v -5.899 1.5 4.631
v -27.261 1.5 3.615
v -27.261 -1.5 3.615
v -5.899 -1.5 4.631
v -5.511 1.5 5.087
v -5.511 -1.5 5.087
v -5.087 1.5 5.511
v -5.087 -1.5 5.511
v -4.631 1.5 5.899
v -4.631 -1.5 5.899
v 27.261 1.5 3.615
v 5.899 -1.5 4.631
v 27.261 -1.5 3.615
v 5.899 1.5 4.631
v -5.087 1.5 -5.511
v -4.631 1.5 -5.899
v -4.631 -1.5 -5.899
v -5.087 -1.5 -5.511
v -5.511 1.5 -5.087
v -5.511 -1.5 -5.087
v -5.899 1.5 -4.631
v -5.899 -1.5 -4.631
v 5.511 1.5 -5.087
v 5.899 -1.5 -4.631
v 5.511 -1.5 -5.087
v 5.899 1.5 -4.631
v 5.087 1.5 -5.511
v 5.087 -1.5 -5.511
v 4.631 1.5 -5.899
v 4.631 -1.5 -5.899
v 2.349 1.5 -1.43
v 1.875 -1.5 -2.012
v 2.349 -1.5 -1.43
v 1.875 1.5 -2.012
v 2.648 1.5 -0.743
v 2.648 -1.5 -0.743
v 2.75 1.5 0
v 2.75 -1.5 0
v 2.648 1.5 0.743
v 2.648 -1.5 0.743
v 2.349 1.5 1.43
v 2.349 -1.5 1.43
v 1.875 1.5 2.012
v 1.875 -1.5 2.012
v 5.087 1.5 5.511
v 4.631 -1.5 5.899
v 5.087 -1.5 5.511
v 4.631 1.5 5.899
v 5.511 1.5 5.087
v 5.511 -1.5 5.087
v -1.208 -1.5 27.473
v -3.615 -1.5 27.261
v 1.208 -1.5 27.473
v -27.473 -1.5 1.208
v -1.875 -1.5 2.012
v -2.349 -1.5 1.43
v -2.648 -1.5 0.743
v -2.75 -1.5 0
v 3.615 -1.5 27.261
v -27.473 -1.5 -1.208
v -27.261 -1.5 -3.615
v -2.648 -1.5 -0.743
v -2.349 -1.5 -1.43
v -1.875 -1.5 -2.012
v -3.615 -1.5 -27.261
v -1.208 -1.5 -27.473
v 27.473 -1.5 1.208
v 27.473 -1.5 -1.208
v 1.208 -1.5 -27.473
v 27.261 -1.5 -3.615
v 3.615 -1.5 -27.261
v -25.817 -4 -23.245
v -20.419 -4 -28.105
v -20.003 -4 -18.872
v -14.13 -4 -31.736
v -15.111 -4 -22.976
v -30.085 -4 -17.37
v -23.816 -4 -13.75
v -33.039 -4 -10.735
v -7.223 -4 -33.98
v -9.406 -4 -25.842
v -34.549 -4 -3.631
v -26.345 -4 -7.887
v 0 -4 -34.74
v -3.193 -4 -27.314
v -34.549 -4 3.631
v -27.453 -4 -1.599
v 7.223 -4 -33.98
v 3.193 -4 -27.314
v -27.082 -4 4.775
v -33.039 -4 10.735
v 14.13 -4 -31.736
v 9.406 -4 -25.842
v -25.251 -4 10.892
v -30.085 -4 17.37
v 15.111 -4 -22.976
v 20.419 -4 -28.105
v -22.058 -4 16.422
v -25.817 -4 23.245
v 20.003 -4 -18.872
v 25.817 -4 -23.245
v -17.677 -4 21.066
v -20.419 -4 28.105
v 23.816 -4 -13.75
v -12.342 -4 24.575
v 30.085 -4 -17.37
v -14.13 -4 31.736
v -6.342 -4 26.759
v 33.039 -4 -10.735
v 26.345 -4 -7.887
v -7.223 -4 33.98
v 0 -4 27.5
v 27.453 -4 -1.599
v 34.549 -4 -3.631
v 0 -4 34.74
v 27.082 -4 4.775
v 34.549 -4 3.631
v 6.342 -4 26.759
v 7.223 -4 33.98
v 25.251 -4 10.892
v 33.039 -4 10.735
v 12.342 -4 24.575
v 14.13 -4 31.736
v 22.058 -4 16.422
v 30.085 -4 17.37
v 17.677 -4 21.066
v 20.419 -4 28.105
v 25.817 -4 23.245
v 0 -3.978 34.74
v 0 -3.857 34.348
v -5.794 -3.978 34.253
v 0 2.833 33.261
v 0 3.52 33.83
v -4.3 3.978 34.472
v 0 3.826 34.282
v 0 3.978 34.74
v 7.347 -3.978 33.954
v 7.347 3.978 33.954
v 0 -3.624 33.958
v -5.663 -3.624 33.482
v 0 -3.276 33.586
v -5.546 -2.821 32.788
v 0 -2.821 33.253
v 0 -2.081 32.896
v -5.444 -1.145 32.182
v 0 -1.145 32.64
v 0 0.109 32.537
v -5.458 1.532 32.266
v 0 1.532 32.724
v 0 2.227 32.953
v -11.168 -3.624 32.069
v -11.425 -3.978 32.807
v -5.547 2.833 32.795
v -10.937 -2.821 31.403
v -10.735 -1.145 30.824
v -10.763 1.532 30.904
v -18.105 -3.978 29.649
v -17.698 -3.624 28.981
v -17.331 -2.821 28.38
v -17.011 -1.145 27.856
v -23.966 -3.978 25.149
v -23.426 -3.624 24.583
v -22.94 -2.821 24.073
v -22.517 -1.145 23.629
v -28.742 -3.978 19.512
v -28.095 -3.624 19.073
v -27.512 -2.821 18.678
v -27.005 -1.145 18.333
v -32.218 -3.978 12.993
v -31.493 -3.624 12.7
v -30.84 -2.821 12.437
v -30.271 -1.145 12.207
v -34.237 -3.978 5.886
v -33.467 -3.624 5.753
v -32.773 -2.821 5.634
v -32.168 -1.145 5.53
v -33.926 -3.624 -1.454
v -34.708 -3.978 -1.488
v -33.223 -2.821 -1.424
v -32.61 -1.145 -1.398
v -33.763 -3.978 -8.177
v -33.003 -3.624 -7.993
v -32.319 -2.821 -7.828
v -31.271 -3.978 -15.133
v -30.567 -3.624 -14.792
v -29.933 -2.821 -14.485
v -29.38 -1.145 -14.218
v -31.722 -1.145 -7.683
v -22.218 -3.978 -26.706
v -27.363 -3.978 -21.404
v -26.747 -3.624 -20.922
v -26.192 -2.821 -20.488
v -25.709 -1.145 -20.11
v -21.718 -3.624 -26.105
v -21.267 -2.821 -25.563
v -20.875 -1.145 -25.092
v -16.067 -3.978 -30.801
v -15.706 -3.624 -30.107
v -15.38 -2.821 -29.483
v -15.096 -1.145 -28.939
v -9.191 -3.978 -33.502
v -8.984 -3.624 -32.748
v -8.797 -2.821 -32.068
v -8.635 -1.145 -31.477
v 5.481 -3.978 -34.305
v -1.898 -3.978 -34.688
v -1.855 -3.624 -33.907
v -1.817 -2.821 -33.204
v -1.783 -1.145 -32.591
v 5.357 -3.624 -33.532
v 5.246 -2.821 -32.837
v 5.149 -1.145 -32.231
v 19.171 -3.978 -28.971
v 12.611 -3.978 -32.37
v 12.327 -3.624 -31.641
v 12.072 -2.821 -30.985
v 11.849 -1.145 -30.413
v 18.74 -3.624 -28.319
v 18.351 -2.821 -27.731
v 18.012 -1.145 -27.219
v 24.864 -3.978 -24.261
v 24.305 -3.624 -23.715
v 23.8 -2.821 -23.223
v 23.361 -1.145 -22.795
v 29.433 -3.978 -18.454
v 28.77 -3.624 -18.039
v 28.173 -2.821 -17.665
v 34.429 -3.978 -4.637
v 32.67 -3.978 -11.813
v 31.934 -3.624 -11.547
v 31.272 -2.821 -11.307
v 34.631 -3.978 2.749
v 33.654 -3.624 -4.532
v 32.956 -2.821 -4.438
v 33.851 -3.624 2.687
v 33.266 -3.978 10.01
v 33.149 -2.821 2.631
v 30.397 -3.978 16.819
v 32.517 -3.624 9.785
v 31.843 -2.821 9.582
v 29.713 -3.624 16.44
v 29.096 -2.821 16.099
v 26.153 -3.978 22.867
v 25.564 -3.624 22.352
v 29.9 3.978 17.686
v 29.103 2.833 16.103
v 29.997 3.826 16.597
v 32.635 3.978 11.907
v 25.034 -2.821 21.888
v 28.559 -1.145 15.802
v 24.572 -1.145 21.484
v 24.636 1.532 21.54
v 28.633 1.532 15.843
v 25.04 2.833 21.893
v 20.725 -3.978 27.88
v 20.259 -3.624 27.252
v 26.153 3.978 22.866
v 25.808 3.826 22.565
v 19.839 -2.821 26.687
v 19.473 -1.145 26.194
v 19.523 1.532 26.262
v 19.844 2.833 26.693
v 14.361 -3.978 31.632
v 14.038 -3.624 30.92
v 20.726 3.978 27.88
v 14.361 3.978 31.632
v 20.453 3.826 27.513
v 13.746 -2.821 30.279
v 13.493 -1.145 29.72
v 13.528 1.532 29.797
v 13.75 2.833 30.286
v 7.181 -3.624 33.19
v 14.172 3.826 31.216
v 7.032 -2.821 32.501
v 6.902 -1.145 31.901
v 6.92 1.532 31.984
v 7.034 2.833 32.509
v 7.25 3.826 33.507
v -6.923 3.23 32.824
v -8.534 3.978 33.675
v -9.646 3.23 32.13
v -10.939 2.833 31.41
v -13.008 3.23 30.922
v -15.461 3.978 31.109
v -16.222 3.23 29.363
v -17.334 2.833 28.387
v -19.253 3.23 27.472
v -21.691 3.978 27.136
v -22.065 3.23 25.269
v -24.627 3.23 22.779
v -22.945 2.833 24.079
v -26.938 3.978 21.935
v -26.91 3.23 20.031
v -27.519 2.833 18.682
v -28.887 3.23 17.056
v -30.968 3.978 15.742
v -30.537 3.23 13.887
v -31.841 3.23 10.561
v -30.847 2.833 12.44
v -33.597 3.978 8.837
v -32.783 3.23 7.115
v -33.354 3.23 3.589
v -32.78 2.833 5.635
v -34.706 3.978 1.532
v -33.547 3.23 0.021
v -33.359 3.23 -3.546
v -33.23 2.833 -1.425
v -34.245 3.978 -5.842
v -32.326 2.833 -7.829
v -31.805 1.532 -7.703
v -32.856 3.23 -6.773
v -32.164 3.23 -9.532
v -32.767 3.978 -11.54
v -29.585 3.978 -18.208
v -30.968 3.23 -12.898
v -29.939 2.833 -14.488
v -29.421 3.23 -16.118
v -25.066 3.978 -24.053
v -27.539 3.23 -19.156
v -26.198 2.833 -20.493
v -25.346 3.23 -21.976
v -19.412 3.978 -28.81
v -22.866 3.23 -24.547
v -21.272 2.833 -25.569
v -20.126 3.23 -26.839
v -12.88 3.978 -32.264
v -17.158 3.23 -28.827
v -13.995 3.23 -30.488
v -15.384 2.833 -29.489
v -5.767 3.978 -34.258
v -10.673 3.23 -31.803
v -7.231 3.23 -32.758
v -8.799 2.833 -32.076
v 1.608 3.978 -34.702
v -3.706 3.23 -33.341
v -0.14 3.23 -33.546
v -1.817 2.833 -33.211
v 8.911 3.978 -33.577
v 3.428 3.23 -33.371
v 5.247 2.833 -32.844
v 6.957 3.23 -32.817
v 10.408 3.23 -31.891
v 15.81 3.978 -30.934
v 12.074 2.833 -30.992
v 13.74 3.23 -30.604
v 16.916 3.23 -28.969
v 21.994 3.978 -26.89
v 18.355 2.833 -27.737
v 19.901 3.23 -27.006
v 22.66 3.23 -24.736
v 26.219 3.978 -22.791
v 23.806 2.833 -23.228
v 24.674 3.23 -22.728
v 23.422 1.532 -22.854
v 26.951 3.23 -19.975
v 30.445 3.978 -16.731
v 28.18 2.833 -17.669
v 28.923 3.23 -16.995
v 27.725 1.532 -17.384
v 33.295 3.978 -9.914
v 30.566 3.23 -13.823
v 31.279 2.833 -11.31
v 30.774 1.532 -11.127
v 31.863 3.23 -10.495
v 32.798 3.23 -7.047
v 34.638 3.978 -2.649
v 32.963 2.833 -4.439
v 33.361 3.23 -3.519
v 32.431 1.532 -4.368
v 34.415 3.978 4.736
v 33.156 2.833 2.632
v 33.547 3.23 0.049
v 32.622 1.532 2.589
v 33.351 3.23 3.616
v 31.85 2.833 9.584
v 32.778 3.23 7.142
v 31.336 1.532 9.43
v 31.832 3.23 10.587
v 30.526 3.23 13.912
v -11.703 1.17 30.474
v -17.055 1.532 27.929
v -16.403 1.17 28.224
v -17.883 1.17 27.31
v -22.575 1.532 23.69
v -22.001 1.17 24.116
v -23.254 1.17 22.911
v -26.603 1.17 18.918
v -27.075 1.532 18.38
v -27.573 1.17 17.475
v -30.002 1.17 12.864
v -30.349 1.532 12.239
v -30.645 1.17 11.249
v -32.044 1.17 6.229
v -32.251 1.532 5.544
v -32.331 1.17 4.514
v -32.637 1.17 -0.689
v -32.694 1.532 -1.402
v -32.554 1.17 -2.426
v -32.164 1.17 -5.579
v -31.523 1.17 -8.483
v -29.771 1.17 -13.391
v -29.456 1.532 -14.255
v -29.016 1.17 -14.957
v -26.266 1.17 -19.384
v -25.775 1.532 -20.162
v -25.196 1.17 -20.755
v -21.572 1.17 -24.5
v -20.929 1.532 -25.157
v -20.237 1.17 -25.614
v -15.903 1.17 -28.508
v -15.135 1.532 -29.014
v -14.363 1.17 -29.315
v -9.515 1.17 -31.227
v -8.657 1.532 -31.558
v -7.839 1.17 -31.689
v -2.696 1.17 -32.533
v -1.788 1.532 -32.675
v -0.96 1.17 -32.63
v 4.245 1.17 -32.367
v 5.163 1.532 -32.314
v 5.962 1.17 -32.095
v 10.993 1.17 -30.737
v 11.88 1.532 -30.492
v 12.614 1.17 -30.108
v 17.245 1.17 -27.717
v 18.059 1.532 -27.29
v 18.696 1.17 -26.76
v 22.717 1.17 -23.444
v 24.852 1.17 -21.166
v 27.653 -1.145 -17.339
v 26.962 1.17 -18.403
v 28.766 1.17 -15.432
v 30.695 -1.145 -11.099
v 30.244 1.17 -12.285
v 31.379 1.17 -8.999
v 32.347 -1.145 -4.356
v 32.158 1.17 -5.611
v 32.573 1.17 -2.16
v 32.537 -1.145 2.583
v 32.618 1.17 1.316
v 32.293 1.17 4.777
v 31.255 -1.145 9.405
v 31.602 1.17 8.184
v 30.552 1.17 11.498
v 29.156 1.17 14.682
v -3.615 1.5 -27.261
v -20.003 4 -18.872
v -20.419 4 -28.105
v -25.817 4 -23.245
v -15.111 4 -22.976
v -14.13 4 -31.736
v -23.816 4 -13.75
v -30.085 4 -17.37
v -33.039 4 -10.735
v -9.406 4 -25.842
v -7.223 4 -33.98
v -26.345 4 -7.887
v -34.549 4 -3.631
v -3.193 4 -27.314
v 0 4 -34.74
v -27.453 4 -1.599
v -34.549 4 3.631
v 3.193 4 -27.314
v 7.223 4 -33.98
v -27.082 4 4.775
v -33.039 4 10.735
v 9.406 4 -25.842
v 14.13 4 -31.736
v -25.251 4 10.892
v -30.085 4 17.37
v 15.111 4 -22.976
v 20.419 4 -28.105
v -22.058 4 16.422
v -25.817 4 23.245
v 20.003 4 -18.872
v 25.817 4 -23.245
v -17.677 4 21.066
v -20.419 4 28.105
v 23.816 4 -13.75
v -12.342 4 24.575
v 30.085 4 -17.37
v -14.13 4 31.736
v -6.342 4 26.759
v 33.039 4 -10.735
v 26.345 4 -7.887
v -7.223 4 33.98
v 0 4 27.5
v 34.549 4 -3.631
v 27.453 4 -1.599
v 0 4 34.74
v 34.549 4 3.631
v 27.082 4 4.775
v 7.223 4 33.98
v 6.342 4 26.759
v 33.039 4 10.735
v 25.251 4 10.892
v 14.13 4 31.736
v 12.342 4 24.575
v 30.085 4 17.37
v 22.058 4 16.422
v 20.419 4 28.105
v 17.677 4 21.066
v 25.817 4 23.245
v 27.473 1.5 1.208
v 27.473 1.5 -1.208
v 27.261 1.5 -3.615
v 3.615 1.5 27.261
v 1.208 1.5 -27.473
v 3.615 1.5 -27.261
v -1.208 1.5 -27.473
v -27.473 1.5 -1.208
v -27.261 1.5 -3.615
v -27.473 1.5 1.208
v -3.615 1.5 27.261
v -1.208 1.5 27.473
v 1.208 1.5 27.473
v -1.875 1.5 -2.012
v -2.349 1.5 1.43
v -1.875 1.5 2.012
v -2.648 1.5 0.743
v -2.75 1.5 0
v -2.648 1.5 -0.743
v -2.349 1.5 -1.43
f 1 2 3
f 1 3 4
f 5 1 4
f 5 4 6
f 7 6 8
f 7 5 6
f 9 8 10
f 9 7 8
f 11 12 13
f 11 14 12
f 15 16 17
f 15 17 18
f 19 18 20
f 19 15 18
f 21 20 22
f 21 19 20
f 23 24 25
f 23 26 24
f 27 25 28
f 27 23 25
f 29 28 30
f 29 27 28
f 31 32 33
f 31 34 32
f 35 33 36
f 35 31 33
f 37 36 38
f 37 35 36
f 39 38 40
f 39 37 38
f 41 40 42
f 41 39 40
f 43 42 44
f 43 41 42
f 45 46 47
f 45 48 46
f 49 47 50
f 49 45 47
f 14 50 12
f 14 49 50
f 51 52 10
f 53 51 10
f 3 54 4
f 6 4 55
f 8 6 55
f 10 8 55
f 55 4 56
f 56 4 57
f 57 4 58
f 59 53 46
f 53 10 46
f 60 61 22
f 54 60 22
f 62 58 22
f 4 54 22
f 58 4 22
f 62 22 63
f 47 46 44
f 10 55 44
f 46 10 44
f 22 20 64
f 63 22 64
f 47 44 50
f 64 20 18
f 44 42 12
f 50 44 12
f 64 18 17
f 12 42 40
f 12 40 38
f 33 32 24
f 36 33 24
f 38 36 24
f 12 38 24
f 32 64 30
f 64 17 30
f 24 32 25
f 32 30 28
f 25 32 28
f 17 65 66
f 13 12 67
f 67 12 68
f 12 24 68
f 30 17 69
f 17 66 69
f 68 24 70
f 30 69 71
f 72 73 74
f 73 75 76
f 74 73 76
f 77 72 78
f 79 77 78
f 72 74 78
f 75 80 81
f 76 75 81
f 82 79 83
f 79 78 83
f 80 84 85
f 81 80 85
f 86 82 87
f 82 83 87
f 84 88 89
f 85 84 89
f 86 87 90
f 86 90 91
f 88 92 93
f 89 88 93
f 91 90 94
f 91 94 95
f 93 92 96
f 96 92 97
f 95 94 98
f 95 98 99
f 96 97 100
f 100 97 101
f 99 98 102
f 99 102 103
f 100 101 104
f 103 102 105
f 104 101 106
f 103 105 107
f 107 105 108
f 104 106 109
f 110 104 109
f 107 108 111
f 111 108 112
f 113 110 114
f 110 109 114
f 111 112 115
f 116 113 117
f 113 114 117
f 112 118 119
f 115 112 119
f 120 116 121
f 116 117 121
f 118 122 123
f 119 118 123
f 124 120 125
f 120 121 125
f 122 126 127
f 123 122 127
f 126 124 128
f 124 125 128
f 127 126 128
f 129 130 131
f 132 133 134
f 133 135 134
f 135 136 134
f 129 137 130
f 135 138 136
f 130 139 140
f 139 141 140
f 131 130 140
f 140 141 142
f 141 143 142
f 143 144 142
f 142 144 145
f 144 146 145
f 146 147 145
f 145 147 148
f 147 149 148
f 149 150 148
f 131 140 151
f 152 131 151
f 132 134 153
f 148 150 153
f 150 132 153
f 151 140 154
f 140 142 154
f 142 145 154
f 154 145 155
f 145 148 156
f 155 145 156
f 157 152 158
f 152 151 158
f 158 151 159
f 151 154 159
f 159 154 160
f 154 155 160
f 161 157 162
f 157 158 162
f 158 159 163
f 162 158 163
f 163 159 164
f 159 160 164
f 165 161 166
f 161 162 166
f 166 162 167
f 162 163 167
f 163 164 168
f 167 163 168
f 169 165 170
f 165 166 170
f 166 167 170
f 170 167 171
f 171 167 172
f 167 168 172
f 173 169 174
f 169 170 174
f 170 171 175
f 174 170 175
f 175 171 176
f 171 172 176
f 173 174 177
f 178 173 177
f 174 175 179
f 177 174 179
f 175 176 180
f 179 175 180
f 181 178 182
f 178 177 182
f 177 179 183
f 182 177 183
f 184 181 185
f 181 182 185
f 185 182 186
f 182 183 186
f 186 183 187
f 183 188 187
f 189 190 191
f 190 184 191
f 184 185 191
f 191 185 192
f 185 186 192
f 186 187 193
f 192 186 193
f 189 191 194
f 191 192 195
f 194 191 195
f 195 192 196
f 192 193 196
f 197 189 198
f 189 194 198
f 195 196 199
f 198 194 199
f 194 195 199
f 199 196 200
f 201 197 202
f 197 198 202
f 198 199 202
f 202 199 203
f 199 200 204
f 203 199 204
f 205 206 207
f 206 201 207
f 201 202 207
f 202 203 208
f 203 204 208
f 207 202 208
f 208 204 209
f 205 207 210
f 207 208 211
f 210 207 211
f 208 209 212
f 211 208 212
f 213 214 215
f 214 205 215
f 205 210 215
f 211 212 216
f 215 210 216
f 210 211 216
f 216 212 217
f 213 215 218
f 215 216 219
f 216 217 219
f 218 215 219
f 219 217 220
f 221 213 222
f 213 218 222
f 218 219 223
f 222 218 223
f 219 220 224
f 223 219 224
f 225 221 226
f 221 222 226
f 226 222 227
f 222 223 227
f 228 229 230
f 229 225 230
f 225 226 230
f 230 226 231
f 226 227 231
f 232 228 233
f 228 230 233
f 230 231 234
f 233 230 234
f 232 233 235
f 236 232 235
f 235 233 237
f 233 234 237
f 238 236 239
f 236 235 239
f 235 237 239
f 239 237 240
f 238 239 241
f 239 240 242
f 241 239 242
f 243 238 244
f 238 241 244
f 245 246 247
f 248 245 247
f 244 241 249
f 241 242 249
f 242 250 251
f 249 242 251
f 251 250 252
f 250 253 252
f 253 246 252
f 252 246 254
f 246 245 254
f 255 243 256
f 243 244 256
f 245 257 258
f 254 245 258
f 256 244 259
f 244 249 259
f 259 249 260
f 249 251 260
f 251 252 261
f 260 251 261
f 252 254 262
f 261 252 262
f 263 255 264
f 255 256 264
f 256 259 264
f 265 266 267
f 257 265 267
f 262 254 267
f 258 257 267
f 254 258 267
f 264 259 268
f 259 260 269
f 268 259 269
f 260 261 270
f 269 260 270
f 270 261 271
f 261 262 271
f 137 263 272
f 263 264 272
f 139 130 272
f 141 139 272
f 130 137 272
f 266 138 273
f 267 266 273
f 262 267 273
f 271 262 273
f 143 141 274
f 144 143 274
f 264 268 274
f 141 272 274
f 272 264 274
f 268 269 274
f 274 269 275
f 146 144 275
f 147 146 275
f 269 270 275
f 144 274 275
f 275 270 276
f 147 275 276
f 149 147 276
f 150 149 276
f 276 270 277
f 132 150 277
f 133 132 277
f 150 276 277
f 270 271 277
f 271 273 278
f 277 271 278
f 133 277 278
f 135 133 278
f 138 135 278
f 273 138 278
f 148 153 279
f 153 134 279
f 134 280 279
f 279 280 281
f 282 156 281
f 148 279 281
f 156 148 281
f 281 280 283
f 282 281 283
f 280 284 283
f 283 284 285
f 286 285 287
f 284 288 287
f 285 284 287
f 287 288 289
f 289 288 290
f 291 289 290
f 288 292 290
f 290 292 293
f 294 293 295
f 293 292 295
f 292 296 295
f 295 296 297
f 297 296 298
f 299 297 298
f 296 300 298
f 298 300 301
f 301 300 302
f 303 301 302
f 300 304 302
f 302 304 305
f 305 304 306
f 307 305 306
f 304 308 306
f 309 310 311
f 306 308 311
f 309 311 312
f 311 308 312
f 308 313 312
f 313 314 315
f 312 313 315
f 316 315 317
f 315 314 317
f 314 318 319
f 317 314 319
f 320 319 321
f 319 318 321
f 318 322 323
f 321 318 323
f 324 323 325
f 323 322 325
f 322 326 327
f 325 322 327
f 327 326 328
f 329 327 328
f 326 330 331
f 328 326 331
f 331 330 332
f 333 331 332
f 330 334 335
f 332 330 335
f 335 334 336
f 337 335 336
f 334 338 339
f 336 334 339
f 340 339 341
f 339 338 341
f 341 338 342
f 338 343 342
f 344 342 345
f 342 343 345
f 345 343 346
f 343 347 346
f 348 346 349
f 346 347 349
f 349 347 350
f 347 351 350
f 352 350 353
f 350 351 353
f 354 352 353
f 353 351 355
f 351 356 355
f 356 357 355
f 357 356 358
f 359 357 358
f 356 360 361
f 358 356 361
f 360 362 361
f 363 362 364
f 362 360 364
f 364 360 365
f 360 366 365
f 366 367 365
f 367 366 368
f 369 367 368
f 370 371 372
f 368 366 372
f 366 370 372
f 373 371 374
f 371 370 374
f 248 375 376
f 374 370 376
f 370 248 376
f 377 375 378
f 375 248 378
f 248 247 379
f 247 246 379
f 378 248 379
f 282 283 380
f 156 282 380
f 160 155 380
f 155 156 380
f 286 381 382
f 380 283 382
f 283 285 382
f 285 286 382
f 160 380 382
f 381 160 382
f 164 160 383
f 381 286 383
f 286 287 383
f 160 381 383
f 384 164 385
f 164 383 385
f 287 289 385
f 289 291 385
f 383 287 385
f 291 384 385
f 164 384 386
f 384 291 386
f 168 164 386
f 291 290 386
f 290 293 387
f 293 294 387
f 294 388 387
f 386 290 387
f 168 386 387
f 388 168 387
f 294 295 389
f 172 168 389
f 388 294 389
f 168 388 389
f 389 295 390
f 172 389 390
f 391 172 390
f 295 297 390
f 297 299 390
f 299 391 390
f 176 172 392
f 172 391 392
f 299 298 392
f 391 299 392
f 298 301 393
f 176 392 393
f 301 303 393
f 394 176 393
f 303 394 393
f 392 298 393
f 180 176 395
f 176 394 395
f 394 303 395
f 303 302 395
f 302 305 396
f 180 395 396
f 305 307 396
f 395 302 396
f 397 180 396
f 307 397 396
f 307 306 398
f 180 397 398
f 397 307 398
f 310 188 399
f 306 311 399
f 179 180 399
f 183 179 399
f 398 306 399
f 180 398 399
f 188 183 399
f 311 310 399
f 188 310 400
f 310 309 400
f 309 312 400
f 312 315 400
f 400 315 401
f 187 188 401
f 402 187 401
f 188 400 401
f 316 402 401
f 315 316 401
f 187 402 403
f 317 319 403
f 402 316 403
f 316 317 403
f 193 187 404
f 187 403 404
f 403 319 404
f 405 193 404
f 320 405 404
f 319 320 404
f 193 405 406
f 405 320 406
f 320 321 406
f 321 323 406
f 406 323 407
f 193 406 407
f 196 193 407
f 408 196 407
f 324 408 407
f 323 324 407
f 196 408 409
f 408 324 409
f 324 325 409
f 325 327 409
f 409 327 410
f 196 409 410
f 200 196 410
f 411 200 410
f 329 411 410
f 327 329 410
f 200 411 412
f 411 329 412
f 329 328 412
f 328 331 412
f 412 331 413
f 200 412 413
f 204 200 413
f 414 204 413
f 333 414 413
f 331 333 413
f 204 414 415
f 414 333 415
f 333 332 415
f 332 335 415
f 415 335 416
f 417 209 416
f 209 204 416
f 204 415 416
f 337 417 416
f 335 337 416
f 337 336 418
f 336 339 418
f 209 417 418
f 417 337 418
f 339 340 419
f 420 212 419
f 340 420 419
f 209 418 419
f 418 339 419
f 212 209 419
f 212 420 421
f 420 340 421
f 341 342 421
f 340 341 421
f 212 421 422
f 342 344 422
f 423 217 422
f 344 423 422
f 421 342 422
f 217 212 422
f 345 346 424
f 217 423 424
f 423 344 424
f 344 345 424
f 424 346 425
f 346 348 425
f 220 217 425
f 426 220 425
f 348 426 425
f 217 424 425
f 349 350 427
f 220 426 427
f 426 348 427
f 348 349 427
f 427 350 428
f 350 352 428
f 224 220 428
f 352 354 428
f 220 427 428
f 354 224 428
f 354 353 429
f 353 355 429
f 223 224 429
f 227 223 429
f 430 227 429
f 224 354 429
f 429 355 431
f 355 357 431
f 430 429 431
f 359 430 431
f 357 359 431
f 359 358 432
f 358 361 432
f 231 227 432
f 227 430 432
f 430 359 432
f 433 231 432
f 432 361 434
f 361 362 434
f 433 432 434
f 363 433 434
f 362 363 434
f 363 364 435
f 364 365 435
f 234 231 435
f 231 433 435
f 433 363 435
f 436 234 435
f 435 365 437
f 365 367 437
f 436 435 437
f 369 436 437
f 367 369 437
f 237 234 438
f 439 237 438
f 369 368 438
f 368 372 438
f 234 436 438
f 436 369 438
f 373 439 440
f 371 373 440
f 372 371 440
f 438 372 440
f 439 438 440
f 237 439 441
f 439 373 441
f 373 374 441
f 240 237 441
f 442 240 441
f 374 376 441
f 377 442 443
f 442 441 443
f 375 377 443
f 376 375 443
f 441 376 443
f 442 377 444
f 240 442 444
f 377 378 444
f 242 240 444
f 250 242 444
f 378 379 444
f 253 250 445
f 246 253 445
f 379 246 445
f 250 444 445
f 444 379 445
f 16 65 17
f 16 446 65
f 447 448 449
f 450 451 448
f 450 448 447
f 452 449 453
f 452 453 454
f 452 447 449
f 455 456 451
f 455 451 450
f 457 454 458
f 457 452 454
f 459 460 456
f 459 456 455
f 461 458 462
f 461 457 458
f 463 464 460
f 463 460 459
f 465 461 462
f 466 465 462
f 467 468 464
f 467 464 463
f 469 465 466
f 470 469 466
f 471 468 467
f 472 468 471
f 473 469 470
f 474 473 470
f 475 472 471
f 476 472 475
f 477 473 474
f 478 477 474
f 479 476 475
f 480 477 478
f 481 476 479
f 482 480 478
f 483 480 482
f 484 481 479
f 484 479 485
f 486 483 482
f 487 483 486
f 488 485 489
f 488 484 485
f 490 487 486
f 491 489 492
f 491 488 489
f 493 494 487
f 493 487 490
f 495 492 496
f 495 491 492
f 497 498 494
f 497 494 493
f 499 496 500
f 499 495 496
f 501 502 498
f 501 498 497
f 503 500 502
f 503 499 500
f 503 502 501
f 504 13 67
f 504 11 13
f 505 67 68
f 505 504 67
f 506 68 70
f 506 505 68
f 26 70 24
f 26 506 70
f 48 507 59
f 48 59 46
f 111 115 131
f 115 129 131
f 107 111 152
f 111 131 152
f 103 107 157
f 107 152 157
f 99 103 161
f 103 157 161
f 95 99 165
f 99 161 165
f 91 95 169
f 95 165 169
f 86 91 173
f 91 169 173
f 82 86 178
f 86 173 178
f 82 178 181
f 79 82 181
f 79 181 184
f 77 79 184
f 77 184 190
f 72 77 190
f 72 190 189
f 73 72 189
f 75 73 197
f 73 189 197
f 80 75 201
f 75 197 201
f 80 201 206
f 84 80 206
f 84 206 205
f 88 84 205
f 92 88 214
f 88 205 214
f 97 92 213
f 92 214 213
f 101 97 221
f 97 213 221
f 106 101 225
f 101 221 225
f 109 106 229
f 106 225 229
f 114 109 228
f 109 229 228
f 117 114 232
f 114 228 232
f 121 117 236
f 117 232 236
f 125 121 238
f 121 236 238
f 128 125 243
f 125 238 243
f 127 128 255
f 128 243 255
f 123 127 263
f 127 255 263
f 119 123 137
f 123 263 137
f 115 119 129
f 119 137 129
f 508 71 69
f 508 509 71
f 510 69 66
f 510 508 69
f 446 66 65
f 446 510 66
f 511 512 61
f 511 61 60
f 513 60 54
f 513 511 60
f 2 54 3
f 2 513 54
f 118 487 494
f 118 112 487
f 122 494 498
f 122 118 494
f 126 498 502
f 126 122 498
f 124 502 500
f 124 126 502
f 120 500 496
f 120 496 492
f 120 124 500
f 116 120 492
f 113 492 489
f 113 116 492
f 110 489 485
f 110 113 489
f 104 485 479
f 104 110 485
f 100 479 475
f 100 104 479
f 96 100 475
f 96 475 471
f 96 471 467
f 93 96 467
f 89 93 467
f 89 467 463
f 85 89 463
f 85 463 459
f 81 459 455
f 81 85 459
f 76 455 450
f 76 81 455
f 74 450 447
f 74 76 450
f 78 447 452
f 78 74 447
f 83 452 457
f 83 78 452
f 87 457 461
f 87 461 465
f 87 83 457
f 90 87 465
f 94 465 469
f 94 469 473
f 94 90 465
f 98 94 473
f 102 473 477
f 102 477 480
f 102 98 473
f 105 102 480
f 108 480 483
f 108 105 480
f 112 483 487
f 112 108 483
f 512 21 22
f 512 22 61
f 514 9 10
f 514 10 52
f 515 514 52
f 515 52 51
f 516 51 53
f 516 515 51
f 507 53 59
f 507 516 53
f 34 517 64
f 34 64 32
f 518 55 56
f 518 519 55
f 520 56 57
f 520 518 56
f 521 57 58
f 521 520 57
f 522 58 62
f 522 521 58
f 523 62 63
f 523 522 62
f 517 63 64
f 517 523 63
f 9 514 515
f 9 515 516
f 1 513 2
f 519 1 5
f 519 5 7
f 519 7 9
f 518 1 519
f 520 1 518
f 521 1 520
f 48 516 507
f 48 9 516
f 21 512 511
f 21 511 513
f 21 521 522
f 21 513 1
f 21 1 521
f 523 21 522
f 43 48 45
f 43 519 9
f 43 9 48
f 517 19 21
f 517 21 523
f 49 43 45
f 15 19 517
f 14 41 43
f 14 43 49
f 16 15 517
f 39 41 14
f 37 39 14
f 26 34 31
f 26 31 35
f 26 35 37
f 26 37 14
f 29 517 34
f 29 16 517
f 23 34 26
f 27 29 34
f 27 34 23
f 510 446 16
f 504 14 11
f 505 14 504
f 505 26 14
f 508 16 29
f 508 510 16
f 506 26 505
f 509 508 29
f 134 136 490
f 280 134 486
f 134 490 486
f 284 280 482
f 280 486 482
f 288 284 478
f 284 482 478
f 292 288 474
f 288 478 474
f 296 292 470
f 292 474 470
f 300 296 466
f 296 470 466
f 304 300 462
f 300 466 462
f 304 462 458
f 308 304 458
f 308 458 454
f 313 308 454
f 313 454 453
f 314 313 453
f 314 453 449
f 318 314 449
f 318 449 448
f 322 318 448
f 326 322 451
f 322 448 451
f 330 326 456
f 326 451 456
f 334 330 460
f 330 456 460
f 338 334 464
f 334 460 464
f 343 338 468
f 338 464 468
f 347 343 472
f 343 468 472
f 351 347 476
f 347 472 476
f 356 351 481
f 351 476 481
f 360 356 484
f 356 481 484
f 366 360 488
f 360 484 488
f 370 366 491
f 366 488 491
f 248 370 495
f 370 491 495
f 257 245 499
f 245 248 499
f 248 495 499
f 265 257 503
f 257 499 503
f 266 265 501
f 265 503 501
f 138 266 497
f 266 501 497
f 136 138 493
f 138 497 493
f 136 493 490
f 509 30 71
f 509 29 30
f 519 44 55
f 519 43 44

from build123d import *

# Parameters (mm, degrees)
SKETCH1_R           = 35
SKETCH1_R_2         = 27.5
BOSS_EXTRUDE3_DEPTH = 4
BOSS_EXTRUDE4_DEPTH = 1.5
SKETCH6_W           = 1.276333044
SKETCH6_H           = 9.874787235


with BuildPart() as part:
    # Sketch1 → Boss-Extrude3 (new, symmetric)
    with BuildSketch(Plane(origin=(0, 0, 0), x_dir=(1, 0, 0), z_dir=(0, 1, 0))):
        with Locations(Location((0, 0, 0), (0, 0, 270))):
            Circle(SKETCH1_R)
        with Locations(Location((0, 0, 0), (0, 0, 270))):
            Circle(SKETCH1_R_2, mode=Mode.SUBTRACT)
    extrude(amount=BOSS_EXTRUDE3_DEPTH, both=True)

    # Sketch4 → Cut-Revolve2 (revolve, cut)
    with BuildSketch(Plane(origin=(0, 0, 0), x_dir=(0, 0, -1), z_dir=(1, 0, 0))):
        with BuildLine():
            Line((-35, 4), (-35, -4))
            add(Edge.make_bspline(
                [(-35, -4), (-32.536361471, -4), (-32.536361471, 0)],
                knots=[0, 0, 0, 1.570796327, 1.570796327, 1.570796327], degree=2, weights=[1, 0.707106781, 1]))
            add(Edge.make_bspline(
                [(-32.536361471, 0), (-32.536361471, 4), (-35, 4)],
                knots=[4.71238898, 4.71238898, 4.71238898, 6.283185307, 6.283185307, 6.283185307], degree=2, weights=[1, 0.707106781, 1]))
        make_face()
    revolve(axis=Axis((0, 4.568524564, 0), (0, -1, 0)), mode=Mode.SUBTRACT)

    # Sketch6 → Cut-Revolve3 (revolve, cut)
    with BuildSketch(Plane.XY, mode=Mode.PRIVATE) as cut_revolve3_sk:
        with Locations((-35.377775098, 0.321071025)):
            Rectangle(SKETCH6_W, SKETCH6_H)
    revolve(cut_revolve3_sk.sketch.rotate(Axis((0, 8.792459599, 0), (0, -1, 0)), 270), axis=Axis((0, 8.792459599, 0), (0, -1, 0)), mode=Mode.SUBTRACT)


with BuildPart() as body_2:
    # Sketch5 → Boss-Extrude4 (new, symmetric)
    with BuildSketch(Plane(origin=(0, 0, 0), x_dir=(1, 0, 0), z_dir=(0, 1, 0))):
        with BuildLine():
            Line((-3.614935254, 27.261369062), (-4.631392956, 5.899169373))
            ThreePointArc((-4.631392956, 5.899169373), (-5.303300859, 5.303300859), (-5.899169373, 4.631392956))
            Line((-5.899169373, 4.631392956), (-27.261369062, 3.614935254))
            ThreePointArc((-27.261369062, 3.614935254), (-27.5, 0), (-27.261369062, -3.614935254))
            Line((-27.261369062, -3.614935254), (-5.899169373, -4.631392956))
            ThreePointArc((-5.899169373, -4.631392956), (-5.303300859, -5.303300859), (-4.631392956, -5.899169373))
            Line((-4.631392956, -5.899169373), (-3.614935254, -27.261369062))
            ThreePointArc((-3.614935254, -27.261369062), (0, -27.5), (3.614935254, -27.261369062))
            Line((3.614935254, -27.261369062), (4.631392956, -5.899169373))
            ThreePointArc((4.631392956, -5.899169373), (5.303300859, -5.303300859), (5.899169373, -4.631392956))
            Line((5.899169373, -4.631392956), (27.261369062, -3.614935254))
            ThreePointArc((27.261369062, -3.614935254), (27.5, 0), (27.261369062, 3.614935254))
            Line((27.261369062, 3.614935254), (5.899169373, 4.631392956))
            ThreePointArc((5.899169373, 4.631392956), (5.303300859, 5.303300859), (4.631392956, 5.899169373))
            Line((4.631392956, 5.899169373), (3.614935254, 27.261369062))
            ThreePointArc((3.614935254, 27.261369062), (0, 27.5), (-3.614935254, 27.261369062))
        make_face()
        with BuildLine():
            Line((-1.875, 2.011684617), (1.875, 2.011684617))
            ThreePointArc((1.875, 2.011684617), (2.75, 0), (1.875, -2.011684617))
            Line((1.875, -2.011684617), (-1.875, -2.011684617))
            ThreePointArc((-1.875, -2.011684617), (-2.75, 0), (-1.875, 2.011684617))
        make_face(mode=Mode.SUBTRACT)
    extrude(amount=BOSS_EXTRUDE4_DEPTH, both=True)


solid = Compound([part.part, body_2.part])
